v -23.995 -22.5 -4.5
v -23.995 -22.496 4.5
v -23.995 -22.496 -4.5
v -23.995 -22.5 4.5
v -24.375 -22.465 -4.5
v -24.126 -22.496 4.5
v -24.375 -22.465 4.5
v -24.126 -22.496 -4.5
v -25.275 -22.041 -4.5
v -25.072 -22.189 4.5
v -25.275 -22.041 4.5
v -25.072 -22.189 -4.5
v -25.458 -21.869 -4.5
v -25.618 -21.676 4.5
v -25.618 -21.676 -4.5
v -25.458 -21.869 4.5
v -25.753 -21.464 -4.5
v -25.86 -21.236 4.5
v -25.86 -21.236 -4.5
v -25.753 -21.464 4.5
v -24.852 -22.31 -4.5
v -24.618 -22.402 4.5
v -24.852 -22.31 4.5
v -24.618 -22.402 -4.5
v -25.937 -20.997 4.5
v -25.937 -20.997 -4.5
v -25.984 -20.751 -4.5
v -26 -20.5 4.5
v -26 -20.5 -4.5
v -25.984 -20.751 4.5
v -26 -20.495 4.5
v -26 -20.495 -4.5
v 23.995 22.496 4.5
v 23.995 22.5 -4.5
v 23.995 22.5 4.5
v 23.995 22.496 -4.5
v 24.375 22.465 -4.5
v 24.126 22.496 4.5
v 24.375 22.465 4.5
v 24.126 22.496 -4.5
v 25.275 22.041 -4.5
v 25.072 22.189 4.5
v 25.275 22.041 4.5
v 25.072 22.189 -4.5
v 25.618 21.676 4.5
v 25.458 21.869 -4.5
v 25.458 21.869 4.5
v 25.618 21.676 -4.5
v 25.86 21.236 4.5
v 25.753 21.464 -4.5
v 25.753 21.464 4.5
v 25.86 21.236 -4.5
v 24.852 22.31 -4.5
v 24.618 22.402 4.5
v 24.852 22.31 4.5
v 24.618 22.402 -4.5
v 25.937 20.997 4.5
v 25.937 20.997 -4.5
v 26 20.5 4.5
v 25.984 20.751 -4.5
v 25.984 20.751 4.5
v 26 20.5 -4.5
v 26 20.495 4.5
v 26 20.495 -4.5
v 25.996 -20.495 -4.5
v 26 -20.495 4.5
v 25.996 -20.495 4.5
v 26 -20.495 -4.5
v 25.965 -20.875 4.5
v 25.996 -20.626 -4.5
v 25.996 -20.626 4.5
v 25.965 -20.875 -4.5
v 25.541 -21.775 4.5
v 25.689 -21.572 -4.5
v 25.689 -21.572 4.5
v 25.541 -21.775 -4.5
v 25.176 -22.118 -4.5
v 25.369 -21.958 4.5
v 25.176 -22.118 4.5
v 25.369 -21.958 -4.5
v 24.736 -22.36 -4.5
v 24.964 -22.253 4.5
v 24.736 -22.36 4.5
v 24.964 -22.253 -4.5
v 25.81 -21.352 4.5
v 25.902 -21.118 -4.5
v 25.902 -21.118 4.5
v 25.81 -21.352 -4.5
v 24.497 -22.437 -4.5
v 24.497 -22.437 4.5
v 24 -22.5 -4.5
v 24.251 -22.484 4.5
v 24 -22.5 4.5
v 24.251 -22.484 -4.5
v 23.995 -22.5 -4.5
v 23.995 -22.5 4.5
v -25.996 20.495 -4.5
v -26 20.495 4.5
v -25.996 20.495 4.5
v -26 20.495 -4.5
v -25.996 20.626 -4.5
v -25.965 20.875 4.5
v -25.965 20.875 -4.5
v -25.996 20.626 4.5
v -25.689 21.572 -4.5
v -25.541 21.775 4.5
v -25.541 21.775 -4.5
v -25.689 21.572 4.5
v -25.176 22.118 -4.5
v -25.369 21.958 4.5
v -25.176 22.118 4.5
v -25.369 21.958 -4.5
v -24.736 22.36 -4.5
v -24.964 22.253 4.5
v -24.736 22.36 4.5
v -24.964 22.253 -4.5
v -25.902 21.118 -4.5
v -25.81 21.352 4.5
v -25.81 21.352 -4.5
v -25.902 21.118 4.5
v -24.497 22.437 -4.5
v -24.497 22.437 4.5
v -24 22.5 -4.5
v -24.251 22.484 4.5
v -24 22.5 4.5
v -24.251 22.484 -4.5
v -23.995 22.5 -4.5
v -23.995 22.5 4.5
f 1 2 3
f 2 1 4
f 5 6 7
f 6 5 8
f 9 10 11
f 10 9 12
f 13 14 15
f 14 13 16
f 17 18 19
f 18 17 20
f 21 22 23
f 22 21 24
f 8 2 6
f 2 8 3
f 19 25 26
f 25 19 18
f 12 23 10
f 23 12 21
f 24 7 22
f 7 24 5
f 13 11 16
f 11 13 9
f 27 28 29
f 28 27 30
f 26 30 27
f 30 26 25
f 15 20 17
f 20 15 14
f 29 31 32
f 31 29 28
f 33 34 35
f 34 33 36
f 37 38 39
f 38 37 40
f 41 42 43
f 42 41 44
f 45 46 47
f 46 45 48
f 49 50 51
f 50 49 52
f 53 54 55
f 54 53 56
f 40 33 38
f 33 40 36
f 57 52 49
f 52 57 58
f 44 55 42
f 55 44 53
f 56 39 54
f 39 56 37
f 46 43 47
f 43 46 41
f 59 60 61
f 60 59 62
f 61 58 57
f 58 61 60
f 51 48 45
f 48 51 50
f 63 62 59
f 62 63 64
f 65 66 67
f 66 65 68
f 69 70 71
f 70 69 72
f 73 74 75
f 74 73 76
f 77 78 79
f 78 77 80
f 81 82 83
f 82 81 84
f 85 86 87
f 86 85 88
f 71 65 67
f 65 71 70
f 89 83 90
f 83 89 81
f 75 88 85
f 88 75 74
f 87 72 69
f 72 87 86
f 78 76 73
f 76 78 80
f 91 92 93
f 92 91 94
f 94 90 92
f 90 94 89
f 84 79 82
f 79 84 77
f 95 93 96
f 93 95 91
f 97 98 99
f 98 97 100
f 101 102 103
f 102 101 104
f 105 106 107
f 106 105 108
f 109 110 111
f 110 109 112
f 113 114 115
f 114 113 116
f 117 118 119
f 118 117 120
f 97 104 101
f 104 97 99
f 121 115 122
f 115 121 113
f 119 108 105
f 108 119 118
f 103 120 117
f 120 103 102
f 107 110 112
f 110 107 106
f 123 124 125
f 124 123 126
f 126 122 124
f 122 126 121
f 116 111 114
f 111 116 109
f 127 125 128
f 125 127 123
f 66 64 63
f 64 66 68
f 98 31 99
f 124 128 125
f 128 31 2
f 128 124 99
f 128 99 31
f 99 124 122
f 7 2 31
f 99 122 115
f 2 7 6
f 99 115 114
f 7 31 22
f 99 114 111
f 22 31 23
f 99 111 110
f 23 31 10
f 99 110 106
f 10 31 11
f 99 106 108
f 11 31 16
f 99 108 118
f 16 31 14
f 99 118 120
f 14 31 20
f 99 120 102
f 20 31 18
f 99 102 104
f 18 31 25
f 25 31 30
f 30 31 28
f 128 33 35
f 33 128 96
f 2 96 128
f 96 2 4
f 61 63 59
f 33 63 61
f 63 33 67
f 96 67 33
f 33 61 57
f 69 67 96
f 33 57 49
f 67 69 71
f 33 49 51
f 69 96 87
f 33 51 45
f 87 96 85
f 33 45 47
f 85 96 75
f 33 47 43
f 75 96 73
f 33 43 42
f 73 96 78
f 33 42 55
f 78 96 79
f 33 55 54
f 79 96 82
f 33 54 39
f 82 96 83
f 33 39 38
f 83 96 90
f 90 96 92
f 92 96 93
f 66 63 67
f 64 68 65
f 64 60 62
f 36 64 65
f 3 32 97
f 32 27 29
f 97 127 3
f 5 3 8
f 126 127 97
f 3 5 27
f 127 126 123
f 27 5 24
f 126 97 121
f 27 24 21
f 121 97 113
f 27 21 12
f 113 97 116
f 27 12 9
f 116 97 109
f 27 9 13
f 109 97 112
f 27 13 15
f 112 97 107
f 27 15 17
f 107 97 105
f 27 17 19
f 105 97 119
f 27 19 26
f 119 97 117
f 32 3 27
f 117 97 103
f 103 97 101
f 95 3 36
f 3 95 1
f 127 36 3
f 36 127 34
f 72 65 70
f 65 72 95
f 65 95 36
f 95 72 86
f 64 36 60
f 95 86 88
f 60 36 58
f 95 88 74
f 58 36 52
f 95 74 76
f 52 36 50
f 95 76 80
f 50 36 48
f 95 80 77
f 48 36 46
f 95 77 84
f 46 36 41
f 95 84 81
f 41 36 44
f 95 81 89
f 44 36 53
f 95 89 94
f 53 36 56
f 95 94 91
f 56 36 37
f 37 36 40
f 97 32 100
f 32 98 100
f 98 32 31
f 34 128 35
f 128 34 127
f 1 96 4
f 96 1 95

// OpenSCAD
roundedCube(52,45,9,2,9.5);

module roundedCube(x, y, z, cornerRadius, filletHeight){
    difference() {
        cube([x, y, z], center=true);
        rotate([0,0,0])translate([(x/-2),(y/-2),0])
        fillet(cornerRadius, filletHeight,10);
        rotate([0,0,180])translate([(x/-2),(y/-2),0])
        fillet(cornerRadius,10);
        rotate([0,0,90])translate([(y/-2),(x/-2),0])
        fillet(cornerRadius,10);
        rotate([0,0,270])translate([(y/-2),(x/-2),0])
        fillet(cornerRadius,10);
    }
}

module fillet(r, h) {
    translate([r / 2, r / 2, 0])
    difference() {
        cube([r + 0.01, r + 0.01, h], center = true);
        translate([r/2, r/2, 0])
        cylinder(r = r, h = h + 1, center = true, $fn=50);
        }
}
 
